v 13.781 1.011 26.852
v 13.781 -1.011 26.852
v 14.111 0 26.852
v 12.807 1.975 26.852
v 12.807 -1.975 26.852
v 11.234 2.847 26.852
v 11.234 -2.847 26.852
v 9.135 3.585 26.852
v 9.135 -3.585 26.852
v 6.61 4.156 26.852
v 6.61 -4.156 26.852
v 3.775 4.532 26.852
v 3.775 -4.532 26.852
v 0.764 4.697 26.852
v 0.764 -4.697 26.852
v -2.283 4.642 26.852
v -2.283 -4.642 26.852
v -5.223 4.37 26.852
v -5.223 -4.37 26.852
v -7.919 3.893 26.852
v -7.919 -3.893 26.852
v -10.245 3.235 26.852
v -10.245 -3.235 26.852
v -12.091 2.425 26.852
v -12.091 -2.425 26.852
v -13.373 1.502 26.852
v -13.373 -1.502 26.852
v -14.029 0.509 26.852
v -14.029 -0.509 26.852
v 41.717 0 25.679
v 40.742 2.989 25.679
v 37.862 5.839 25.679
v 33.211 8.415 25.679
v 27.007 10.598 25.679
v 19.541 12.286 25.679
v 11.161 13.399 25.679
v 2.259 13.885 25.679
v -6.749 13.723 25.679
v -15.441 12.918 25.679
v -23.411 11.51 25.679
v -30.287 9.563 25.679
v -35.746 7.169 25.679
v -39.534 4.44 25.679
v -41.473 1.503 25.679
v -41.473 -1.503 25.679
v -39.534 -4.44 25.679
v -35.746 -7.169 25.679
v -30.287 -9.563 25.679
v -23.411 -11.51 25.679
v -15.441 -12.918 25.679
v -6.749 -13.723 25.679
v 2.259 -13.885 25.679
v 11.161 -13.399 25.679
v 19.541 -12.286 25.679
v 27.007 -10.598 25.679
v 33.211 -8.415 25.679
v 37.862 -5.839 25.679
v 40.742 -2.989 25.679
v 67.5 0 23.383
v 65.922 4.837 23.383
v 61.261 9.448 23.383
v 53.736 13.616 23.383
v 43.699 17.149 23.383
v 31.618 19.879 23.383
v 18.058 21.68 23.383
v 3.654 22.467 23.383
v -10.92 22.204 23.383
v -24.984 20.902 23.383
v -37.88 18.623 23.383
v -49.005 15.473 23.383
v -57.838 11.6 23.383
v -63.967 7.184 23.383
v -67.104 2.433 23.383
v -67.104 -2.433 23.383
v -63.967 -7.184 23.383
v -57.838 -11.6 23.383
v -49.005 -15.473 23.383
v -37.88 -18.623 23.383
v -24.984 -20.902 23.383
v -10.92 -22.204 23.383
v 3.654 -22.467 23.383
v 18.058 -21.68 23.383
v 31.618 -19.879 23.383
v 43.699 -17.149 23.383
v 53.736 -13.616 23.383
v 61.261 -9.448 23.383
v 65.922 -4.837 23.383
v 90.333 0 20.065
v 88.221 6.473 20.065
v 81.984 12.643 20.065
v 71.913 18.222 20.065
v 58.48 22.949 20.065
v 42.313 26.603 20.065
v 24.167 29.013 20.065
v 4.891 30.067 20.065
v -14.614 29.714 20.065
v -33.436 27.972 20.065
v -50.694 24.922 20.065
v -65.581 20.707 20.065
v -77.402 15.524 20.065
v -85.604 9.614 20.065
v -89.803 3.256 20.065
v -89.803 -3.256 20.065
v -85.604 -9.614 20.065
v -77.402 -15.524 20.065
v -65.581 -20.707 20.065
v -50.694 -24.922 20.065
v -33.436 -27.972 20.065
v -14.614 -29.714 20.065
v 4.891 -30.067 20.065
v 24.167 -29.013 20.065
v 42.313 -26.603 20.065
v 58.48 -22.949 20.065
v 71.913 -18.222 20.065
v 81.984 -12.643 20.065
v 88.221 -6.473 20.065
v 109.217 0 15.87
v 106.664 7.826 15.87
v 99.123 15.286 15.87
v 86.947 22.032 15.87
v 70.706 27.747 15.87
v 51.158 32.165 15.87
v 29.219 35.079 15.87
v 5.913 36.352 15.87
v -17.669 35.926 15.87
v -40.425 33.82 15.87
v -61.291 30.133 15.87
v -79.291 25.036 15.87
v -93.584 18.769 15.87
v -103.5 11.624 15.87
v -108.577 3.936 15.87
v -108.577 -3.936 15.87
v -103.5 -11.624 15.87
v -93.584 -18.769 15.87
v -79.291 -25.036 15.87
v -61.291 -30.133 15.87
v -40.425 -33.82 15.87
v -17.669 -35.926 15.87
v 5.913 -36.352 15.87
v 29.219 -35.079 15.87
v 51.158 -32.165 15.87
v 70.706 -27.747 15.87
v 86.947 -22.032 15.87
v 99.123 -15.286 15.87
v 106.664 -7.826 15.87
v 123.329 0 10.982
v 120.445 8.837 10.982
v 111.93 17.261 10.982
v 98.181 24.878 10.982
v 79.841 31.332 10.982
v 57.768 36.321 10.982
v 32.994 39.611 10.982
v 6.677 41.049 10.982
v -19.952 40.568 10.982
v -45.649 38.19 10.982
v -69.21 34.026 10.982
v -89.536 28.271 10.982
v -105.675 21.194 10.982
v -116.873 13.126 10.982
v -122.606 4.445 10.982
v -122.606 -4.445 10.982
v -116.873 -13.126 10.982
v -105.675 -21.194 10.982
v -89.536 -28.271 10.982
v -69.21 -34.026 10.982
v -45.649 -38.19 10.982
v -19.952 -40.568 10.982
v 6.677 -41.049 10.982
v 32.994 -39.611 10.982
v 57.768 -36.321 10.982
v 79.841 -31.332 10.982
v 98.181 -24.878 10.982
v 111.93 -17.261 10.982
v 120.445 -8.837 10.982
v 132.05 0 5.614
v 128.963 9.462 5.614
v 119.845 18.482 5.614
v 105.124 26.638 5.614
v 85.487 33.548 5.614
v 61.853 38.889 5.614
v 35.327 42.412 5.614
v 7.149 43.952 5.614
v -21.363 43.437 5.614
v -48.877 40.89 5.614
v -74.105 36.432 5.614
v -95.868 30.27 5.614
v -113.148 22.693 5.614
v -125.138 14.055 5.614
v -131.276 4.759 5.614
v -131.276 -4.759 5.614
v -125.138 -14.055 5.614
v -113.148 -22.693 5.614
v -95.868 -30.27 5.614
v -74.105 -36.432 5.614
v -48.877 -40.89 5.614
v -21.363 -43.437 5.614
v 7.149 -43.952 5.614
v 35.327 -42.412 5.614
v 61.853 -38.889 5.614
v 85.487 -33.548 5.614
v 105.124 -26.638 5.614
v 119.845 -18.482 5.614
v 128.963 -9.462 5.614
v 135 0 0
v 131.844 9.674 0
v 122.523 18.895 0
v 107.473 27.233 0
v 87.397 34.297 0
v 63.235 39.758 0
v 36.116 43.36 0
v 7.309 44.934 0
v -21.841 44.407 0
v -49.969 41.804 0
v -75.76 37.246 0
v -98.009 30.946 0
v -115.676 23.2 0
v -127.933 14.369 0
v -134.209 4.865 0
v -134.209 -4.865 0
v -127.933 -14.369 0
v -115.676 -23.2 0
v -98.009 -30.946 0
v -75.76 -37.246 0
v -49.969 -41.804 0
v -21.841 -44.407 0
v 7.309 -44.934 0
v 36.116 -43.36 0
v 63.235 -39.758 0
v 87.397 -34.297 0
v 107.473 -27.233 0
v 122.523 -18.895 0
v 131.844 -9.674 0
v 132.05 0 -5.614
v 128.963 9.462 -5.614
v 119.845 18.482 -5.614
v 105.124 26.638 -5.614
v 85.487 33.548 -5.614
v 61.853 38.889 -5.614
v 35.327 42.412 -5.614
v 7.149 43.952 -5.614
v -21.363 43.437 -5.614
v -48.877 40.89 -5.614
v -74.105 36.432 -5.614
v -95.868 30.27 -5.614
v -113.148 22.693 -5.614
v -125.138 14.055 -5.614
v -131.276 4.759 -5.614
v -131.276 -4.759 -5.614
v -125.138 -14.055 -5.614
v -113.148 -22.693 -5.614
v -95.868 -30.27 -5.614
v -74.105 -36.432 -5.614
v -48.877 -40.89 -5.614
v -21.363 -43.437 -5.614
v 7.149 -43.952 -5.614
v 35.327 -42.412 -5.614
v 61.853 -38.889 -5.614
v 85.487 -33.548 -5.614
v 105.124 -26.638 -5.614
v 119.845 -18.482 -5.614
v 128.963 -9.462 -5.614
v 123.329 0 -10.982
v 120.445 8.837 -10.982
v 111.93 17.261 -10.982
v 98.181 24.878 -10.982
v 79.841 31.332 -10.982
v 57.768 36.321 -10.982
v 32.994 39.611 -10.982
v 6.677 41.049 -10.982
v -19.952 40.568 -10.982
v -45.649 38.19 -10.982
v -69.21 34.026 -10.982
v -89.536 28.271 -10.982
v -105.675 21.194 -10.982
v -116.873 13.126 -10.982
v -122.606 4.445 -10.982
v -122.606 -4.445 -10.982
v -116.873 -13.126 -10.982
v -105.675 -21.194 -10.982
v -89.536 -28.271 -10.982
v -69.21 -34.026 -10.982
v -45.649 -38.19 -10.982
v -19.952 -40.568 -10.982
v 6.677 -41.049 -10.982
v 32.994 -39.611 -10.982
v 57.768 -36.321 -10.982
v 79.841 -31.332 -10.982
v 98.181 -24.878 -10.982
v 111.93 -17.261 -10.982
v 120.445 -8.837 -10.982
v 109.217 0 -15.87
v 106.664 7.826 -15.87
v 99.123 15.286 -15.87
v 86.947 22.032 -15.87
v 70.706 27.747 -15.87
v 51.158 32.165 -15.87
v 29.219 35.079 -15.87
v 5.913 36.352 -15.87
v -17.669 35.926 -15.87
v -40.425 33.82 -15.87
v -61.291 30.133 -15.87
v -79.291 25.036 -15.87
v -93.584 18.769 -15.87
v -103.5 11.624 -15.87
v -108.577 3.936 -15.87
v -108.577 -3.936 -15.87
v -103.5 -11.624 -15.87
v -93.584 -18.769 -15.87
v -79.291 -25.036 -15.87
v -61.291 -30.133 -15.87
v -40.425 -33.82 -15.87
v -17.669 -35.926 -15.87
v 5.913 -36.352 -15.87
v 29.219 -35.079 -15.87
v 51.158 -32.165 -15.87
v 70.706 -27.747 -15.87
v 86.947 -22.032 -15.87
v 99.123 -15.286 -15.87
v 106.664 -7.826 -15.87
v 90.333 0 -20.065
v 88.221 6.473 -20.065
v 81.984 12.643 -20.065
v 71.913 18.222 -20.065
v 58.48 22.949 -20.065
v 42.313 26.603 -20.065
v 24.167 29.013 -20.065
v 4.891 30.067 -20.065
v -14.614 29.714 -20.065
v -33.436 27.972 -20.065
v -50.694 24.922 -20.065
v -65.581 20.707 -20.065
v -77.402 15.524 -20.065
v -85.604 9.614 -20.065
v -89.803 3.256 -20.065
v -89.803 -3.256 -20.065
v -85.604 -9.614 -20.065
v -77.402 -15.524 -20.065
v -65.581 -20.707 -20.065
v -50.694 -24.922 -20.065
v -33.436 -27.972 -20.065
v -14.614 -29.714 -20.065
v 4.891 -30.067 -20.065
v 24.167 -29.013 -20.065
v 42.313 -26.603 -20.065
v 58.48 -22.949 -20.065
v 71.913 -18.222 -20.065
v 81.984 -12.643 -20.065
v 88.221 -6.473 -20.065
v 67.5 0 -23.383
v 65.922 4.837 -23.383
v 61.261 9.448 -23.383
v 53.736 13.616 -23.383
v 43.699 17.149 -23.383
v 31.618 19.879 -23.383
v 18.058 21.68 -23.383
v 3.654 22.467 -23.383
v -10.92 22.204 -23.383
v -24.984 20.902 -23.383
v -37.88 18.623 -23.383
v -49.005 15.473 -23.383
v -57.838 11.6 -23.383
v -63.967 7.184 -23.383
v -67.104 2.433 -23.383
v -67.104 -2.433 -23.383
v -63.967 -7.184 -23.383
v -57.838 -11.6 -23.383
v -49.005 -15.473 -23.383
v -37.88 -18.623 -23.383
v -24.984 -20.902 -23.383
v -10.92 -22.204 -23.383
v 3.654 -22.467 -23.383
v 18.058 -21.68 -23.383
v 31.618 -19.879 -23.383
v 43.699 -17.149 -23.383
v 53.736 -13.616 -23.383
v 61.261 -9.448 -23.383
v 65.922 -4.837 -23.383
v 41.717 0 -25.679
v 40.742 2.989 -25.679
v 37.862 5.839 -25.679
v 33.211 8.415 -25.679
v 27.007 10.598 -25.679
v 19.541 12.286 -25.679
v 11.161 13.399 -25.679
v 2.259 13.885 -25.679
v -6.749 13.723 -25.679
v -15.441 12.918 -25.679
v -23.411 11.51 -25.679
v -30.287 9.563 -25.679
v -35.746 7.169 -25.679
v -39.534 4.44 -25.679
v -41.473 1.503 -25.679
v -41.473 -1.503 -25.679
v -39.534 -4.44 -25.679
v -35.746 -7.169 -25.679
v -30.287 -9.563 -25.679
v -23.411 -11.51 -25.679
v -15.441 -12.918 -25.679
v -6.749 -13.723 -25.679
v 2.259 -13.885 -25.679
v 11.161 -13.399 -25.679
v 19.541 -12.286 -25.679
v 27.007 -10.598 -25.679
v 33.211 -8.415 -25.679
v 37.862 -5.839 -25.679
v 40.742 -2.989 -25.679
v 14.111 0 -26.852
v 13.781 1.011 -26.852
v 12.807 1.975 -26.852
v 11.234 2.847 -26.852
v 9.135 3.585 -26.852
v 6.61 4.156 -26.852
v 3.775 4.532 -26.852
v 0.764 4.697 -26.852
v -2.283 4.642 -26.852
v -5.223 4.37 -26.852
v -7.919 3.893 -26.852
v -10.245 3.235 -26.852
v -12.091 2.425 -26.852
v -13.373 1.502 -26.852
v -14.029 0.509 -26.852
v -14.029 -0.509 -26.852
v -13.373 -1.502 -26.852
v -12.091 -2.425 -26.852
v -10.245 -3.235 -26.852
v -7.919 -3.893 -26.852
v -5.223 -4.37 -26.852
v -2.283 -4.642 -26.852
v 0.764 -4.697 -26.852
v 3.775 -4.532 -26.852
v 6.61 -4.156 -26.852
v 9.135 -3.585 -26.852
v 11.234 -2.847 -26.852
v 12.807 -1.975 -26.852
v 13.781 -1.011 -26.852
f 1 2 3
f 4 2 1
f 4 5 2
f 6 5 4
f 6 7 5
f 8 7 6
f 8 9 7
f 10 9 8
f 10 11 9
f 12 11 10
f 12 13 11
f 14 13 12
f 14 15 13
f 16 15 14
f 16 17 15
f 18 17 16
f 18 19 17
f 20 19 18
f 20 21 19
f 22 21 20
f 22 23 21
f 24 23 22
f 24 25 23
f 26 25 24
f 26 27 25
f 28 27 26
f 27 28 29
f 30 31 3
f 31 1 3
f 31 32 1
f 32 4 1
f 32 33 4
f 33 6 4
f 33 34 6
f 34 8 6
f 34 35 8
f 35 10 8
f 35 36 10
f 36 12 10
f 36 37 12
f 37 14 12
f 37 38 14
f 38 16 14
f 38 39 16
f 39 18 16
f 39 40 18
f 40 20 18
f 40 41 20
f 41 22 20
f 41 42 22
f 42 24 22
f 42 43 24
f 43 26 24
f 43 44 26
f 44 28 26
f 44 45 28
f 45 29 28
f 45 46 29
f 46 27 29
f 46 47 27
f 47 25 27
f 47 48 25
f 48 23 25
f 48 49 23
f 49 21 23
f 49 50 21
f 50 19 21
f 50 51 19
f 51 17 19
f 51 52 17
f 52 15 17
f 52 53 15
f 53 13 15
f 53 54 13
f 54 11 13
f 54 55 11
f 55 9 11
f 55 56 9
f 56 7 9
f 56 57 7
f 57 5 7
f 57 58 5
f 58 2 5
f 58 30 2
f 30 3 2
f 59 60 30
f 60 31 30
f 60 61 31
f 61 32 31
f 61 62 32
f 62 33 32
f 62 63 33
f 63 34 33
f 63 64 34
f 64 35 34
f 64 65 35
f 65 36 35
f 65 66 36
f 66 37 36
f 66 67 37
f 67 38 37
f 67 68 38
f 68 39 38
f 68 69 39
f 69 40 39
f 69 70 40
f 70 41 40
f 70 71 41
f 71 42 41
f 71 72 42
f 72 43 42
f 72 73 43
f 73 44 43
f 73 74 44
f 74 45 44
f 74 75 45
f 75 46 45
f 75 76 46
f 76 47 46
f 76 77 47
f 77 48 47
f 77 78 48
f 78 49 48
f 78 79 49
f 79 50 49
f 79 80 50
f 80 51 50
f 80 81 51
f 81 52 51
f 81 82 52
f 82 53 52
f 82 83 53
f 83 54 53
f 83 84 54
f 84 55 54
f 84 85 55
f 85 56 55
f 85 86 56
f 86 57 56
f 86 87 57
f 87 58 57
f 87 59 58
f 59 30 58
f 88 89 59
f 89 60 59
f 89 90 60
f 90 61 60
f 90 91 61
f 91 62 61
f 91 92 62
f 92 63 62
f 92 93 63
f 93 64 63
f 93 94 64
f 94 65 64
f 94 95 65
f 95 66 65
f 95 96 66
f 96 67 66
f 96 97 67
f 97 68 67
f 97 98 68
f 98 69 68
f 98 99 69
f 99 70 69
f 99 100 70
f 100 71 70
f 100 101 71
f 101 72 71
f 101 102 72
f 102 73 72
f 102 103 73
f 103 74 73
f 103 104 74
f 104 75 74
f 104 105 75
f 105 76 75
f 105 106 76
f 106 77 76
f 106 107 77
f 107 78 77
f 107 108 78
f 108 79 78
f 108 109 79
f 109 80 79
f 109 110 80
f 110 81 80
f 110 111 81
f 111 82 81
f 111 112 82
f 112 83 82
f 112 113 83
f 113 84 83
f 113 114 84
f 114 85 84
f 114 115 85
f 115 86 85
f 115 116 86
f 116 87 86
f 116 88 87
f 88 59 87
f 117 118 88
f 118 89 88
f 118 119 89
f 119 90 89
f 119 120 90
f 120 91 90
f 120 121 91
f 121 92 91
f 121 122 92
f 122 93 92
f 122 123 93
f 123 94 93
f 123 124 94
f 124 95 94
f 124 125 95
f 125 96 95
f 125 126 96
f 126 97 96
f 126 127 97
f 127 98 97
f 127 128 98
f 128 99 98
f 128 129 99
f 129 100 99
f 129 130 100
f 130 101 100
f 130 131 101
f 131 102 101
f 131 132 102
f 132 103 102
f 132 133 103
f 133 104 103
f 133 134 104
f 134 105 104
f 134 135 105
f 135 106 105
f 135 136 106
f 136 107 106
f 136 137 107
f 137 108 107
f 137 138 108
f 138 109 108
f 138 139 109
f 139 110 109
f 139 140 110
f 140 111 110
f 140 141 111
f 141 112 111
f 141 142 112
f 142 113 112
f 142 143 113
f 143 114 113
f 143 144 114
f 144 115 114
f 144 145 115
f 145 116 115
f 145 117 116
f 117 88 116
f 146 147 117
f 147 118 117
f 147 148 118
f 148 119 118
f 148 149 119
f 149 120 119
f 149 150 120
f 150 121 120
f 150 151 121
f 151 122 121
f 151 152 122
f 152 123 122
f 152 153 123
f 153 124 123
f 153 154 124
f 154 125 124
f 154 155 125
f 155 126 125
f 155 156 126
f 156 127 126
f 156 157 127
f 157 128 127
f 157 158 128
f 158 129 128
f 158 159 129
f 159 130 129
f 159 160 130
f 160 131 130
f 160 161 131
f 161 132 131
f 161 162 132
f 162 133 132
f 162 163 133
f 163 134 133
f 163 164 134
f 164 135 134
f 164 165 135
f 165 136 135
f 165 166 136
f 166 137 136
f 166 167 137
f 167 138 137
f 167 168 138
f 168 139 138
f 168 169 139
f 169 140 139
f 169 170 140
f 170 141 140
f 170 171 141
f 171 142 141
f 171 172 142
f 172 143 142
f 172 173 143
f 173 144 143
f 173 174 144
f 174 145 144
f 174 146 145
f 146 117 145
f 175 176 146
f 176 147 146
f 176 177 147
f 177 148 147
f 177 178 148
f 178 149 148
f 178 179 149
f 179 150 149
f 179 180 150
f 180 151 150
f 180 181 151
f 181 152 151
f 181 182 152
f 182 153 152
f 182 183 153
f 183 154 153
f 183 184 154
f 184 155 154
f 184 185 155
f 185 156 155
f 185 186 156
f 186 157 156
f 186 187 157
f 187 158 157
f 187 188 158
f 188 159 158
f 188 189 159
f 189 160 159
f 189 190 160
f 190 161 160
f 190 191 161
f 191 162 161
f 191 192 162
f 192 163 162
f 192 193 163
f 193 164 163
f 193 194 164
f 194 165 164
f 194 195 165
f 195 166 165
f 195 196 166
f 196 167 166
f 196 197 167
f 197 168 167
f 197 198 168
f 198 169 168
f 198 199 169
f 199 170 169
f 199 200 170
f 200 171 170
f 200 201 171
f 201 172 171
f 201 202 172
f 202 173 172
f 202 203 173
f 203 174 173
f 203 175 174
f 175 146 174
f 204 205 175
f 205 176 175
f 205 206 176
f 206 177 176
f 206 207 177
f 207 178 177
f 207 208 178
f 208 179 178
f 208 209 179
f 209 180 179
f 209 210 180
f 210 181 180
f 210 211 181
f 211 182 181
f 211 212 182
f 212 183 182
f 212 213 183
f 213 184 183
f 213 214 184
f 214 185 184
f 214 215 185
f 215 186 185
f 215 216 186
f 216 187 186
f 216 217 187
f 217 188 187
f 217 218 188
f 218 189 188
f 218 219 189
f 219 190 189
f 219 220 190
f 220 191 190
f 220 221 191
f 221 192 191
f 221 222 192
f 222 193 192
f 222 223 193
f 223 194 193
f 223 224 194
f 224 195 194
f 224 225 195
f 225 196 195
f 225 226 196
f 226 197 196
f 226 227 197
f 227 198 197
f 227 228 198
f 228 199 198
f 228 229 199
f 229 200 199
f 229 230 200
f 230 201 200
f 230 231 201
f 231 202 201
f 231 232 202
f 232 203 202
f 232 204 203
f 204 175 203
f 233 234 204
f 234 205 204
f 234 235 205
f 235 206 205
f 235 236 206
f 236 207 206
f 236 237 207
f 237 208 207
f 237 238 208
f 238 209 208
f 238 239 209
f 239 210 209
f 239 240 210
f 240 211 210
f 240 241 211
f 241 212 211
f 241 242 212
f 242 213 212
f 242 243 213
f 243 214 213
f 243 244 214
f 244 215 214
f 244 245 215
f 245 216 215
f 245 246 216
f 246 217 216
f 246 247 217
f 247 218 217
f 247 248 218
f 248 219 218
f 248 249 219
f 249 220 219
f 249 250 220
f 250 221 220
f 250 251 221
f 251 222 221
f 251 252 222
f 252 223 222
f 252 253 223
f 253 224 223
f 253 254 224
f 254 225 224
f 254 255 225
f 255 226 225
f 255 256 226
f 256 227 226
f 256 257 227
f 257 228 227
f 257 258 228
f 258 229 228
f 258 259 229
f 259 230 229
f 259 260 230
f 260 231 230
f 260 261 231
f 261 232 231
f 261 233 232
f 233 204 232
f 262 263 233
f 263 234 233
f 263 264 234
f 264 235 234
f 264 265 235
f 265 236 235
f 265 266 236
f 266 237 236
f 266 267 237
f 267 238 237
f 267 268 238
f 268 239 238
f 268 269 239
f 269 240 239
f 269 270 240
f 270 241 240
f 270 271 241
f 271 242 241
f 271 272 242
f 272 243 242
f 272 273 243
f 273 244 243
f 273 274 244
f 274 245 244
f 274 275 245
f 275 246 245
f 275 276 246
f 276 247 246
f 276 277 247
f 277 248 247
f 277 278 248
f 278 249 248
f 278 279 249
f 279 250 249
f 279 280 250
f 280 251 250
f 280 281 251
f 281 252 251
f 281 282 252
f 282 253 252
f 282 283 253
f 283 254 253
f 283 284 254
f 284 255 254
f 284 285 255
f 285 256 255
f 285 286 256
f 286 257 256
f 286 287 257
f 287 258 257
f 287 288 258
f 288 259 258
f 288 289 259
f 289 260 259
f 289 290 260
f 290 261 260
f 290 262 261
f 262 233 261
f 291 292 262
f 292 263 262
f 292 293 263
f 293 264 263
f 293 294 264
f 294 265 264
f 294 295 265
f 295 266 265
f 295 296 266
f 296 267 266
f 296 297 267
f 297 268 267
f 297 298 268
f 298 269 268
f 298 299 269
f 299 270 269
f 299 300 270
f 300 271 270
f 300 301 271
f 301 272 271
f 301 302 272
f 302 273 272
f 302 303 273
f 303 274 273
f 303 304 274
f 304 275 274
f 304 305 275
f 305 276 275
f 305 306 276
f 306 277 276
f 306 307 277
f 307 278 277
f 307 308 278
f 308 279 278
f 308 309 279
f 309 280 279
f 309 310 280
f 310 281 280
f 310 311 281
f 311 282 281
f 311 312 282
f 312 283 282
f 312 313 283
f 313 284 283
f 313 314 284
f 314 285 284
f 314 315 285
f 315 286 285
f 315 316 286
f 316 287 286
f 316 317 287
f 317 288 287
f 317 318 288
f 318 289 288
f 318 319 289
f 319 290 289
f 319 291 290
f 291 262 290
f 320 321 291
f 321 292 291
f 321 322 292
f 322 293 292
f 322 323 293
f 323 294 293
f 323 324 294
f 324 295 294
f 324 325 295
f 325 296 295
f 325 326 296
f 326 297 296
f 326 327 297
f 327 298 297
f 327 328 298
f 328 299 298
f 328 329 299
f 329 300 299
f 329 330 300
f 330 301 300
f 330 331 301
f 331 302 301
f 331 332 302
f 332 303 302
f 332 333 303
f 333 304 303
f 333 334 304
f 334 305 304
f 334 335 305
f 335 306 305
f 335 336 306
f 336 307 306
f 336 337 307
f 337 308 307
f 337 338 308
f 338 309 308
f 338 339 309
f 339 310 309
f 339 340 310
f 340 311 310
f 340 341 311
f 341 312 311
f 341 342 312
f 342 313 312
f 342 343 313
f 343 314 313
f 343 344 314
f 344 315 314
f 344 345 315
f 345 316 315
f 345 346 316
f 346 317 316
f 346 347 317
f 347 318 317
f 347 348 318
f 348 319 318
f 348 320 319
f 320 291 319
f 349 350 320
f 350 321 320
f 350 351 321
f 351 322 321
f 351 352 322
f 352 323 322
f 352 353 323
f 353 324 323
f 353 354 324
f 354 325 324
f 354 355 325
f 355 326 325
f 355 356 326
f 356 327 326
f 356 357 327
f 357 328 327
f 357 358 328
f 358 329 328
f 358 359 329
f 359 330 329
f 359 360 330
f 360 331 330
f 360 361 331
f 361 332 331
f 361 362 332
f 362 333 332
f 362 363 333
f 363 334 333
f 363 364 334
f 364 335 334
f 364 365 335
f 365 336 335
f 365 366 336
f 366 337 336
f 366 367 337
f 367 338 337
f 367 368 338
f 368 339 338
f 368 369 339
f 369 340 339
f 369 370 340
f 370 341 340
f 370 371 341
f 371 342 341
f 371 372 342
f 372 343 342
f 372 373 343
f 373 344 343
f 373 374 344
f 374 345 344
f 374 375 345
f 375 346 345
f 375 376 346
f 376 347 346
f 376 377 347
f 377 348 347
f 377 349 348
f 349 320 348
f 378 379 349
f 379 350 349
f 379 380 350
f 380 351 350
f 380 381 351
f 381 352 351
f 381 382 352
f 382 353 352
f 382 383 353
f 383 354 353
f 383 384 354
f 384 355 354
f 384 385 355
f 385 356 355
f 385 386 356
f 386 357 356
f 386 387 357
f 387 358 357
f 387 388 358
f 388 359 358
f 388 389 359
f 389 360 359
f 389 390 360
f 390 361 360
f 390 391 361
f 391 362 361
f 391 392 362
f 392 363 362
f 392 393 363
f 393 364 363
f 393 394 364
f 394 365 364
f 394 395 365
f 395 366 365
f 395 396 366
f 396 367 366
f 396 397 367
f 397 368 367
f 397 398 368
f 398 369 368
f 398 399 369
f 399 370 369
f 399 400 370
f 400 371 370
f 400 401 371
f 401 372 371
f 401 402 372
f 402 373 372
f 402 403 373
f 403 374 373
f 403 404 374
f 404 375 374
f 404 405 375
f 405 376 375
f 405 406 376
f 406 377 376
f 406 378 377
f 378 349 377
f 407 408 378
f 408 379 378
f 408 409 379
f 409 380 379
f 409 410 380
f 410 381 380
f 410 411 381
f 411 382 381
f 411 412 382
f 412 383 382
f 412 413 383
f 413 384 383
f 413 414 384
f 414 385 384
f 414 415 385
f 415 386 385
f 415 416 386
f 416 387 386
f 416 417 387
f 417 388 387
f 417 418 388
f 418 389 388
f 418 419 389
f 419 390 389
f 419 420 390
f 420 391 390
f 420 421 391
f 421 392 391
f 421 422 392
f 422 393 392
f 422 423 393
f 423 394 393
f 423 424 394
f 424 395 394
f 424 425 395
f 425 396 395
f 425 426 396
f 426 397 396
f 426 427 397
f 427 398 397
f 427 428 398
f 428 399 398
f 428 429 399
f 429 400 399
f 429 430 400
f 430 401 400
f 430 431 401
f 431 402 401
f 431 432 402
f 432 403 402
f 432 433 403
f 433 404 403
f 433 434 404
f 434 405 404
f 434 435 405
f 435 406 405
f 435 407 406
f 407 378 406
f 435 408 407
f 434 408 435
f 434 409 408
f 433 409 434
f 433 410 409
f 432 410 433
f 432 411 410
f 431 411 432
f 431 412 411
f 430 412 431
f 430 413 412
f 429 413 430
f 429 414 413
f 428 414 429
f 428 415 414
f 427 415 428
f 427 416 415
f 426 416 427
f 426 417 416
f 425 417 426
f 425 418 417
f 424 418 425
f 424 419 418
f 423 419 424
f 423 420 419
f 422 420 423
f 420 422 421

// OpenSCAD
// Generated by SolidPython 1.0.1 on 2020-07-29 00:46:51


scale(v = [15, 5, 3]) {
	sphere(r = 9);
}
/***********************************************
*********      SolidPython code:      **********
************************************************
 
# import packages: SolidPython
from solid import *
from solid.utils import *
from itertools import chain, combinations, permutations


class Resize:

    def __init__(self, scad_file):
        self.scad_file = scad_file
        #self.scad_file = import_scad(scad_file)
        # cone/cylinder param:
        self.r1 = 0
        self.r2 = 0
        self.h = 0
        # rectangular prism param:
        self.w = 0
        self.l = 0
        # ellipse param:
        self.r = 0

    # import OpenScad code (file name corresponds to shape)


    # classify shape + parameters
    def assign(self, param1, param2, param3):
        if self.scad_file == 'cone.scad':
            self.r1 = param1
            self.r2 = param2
            self.h = param3
        elif self.scad_file == 'cylinder.scad':
            self.r1 = param1
            self.r2 = param2
            self.h = param3
        elif self.scad_file == 'rectangularPrism.scad':
            self.h = param1
            self.l = param2
            self.w = param3
        else:
            self.r = param1
            self.h = param2

    # resize parameters
    def iterate(self):
        x = range(3, 20, 2)
        i = 1
        if self.scad_file == 'cone.scad':
            tempList = list(permutations(x, 2))
            for temp in tempList:
                param1 = temp[0]
                param2 = temp[1]
                filepath = 'produced_scad_files/' + 'cone' + str(param1) + '_' + str(param2) + '_' + '.scad'
                scad_render_to_file(cylinder(h=param1, r1=param2, r2=0), filepath)

        elif self.scad_file == 'cylinder.scad':
            tempList = list(permutations(x, 3))
            for temp in tempList:
                param1 = temp[0]
                param2 = temp[1]
                filepath = 'produced_scad_files/' + 'cylinder' + str(param1) + '_' + str(param2) + '_' + '.scad'
                scad_render_to_file(cylinder(h=param1, r1=param2, r2=param2), filepath)

        elif self.scad_file == 'rectangularPrism.scad':
            tempList = list(permutations(x, 3))
            for temp in tempList:
                param1 = temp[0]
                param2 = temp[1]
                param3 = temp[2]
                filepath = 'produced_scad_files/' + 'rectangularPrism' + str(param1) + '_' + str(param2) + '_' + str(
                    param3) + '.scad'
                scad_render_to_file(cube(size=(param1, param2, param3)), filepath)

        elif self.scad_file == 'ellipse.scad':
            tempList = list(permutations(x, 4))
            for temp in tempList:
                param1 = temp[0]
                param2 = temp[1]
                param3 = temp[2]
                param4 = temp[3]
                filepath = 'produced_scad_files/' + 'ellipse' + str(param1) + '_' + str(param2) + '_' + str(param3) + '_' + str(param4) + '.scad'
                scad_render_to_file(scale([param1, param2, param3])(sphere(r=param4)), filepath)

    def render_to_scadfile(self):
        scad_render_to_file(scad, 'example.scad') 
 
************************************************/
